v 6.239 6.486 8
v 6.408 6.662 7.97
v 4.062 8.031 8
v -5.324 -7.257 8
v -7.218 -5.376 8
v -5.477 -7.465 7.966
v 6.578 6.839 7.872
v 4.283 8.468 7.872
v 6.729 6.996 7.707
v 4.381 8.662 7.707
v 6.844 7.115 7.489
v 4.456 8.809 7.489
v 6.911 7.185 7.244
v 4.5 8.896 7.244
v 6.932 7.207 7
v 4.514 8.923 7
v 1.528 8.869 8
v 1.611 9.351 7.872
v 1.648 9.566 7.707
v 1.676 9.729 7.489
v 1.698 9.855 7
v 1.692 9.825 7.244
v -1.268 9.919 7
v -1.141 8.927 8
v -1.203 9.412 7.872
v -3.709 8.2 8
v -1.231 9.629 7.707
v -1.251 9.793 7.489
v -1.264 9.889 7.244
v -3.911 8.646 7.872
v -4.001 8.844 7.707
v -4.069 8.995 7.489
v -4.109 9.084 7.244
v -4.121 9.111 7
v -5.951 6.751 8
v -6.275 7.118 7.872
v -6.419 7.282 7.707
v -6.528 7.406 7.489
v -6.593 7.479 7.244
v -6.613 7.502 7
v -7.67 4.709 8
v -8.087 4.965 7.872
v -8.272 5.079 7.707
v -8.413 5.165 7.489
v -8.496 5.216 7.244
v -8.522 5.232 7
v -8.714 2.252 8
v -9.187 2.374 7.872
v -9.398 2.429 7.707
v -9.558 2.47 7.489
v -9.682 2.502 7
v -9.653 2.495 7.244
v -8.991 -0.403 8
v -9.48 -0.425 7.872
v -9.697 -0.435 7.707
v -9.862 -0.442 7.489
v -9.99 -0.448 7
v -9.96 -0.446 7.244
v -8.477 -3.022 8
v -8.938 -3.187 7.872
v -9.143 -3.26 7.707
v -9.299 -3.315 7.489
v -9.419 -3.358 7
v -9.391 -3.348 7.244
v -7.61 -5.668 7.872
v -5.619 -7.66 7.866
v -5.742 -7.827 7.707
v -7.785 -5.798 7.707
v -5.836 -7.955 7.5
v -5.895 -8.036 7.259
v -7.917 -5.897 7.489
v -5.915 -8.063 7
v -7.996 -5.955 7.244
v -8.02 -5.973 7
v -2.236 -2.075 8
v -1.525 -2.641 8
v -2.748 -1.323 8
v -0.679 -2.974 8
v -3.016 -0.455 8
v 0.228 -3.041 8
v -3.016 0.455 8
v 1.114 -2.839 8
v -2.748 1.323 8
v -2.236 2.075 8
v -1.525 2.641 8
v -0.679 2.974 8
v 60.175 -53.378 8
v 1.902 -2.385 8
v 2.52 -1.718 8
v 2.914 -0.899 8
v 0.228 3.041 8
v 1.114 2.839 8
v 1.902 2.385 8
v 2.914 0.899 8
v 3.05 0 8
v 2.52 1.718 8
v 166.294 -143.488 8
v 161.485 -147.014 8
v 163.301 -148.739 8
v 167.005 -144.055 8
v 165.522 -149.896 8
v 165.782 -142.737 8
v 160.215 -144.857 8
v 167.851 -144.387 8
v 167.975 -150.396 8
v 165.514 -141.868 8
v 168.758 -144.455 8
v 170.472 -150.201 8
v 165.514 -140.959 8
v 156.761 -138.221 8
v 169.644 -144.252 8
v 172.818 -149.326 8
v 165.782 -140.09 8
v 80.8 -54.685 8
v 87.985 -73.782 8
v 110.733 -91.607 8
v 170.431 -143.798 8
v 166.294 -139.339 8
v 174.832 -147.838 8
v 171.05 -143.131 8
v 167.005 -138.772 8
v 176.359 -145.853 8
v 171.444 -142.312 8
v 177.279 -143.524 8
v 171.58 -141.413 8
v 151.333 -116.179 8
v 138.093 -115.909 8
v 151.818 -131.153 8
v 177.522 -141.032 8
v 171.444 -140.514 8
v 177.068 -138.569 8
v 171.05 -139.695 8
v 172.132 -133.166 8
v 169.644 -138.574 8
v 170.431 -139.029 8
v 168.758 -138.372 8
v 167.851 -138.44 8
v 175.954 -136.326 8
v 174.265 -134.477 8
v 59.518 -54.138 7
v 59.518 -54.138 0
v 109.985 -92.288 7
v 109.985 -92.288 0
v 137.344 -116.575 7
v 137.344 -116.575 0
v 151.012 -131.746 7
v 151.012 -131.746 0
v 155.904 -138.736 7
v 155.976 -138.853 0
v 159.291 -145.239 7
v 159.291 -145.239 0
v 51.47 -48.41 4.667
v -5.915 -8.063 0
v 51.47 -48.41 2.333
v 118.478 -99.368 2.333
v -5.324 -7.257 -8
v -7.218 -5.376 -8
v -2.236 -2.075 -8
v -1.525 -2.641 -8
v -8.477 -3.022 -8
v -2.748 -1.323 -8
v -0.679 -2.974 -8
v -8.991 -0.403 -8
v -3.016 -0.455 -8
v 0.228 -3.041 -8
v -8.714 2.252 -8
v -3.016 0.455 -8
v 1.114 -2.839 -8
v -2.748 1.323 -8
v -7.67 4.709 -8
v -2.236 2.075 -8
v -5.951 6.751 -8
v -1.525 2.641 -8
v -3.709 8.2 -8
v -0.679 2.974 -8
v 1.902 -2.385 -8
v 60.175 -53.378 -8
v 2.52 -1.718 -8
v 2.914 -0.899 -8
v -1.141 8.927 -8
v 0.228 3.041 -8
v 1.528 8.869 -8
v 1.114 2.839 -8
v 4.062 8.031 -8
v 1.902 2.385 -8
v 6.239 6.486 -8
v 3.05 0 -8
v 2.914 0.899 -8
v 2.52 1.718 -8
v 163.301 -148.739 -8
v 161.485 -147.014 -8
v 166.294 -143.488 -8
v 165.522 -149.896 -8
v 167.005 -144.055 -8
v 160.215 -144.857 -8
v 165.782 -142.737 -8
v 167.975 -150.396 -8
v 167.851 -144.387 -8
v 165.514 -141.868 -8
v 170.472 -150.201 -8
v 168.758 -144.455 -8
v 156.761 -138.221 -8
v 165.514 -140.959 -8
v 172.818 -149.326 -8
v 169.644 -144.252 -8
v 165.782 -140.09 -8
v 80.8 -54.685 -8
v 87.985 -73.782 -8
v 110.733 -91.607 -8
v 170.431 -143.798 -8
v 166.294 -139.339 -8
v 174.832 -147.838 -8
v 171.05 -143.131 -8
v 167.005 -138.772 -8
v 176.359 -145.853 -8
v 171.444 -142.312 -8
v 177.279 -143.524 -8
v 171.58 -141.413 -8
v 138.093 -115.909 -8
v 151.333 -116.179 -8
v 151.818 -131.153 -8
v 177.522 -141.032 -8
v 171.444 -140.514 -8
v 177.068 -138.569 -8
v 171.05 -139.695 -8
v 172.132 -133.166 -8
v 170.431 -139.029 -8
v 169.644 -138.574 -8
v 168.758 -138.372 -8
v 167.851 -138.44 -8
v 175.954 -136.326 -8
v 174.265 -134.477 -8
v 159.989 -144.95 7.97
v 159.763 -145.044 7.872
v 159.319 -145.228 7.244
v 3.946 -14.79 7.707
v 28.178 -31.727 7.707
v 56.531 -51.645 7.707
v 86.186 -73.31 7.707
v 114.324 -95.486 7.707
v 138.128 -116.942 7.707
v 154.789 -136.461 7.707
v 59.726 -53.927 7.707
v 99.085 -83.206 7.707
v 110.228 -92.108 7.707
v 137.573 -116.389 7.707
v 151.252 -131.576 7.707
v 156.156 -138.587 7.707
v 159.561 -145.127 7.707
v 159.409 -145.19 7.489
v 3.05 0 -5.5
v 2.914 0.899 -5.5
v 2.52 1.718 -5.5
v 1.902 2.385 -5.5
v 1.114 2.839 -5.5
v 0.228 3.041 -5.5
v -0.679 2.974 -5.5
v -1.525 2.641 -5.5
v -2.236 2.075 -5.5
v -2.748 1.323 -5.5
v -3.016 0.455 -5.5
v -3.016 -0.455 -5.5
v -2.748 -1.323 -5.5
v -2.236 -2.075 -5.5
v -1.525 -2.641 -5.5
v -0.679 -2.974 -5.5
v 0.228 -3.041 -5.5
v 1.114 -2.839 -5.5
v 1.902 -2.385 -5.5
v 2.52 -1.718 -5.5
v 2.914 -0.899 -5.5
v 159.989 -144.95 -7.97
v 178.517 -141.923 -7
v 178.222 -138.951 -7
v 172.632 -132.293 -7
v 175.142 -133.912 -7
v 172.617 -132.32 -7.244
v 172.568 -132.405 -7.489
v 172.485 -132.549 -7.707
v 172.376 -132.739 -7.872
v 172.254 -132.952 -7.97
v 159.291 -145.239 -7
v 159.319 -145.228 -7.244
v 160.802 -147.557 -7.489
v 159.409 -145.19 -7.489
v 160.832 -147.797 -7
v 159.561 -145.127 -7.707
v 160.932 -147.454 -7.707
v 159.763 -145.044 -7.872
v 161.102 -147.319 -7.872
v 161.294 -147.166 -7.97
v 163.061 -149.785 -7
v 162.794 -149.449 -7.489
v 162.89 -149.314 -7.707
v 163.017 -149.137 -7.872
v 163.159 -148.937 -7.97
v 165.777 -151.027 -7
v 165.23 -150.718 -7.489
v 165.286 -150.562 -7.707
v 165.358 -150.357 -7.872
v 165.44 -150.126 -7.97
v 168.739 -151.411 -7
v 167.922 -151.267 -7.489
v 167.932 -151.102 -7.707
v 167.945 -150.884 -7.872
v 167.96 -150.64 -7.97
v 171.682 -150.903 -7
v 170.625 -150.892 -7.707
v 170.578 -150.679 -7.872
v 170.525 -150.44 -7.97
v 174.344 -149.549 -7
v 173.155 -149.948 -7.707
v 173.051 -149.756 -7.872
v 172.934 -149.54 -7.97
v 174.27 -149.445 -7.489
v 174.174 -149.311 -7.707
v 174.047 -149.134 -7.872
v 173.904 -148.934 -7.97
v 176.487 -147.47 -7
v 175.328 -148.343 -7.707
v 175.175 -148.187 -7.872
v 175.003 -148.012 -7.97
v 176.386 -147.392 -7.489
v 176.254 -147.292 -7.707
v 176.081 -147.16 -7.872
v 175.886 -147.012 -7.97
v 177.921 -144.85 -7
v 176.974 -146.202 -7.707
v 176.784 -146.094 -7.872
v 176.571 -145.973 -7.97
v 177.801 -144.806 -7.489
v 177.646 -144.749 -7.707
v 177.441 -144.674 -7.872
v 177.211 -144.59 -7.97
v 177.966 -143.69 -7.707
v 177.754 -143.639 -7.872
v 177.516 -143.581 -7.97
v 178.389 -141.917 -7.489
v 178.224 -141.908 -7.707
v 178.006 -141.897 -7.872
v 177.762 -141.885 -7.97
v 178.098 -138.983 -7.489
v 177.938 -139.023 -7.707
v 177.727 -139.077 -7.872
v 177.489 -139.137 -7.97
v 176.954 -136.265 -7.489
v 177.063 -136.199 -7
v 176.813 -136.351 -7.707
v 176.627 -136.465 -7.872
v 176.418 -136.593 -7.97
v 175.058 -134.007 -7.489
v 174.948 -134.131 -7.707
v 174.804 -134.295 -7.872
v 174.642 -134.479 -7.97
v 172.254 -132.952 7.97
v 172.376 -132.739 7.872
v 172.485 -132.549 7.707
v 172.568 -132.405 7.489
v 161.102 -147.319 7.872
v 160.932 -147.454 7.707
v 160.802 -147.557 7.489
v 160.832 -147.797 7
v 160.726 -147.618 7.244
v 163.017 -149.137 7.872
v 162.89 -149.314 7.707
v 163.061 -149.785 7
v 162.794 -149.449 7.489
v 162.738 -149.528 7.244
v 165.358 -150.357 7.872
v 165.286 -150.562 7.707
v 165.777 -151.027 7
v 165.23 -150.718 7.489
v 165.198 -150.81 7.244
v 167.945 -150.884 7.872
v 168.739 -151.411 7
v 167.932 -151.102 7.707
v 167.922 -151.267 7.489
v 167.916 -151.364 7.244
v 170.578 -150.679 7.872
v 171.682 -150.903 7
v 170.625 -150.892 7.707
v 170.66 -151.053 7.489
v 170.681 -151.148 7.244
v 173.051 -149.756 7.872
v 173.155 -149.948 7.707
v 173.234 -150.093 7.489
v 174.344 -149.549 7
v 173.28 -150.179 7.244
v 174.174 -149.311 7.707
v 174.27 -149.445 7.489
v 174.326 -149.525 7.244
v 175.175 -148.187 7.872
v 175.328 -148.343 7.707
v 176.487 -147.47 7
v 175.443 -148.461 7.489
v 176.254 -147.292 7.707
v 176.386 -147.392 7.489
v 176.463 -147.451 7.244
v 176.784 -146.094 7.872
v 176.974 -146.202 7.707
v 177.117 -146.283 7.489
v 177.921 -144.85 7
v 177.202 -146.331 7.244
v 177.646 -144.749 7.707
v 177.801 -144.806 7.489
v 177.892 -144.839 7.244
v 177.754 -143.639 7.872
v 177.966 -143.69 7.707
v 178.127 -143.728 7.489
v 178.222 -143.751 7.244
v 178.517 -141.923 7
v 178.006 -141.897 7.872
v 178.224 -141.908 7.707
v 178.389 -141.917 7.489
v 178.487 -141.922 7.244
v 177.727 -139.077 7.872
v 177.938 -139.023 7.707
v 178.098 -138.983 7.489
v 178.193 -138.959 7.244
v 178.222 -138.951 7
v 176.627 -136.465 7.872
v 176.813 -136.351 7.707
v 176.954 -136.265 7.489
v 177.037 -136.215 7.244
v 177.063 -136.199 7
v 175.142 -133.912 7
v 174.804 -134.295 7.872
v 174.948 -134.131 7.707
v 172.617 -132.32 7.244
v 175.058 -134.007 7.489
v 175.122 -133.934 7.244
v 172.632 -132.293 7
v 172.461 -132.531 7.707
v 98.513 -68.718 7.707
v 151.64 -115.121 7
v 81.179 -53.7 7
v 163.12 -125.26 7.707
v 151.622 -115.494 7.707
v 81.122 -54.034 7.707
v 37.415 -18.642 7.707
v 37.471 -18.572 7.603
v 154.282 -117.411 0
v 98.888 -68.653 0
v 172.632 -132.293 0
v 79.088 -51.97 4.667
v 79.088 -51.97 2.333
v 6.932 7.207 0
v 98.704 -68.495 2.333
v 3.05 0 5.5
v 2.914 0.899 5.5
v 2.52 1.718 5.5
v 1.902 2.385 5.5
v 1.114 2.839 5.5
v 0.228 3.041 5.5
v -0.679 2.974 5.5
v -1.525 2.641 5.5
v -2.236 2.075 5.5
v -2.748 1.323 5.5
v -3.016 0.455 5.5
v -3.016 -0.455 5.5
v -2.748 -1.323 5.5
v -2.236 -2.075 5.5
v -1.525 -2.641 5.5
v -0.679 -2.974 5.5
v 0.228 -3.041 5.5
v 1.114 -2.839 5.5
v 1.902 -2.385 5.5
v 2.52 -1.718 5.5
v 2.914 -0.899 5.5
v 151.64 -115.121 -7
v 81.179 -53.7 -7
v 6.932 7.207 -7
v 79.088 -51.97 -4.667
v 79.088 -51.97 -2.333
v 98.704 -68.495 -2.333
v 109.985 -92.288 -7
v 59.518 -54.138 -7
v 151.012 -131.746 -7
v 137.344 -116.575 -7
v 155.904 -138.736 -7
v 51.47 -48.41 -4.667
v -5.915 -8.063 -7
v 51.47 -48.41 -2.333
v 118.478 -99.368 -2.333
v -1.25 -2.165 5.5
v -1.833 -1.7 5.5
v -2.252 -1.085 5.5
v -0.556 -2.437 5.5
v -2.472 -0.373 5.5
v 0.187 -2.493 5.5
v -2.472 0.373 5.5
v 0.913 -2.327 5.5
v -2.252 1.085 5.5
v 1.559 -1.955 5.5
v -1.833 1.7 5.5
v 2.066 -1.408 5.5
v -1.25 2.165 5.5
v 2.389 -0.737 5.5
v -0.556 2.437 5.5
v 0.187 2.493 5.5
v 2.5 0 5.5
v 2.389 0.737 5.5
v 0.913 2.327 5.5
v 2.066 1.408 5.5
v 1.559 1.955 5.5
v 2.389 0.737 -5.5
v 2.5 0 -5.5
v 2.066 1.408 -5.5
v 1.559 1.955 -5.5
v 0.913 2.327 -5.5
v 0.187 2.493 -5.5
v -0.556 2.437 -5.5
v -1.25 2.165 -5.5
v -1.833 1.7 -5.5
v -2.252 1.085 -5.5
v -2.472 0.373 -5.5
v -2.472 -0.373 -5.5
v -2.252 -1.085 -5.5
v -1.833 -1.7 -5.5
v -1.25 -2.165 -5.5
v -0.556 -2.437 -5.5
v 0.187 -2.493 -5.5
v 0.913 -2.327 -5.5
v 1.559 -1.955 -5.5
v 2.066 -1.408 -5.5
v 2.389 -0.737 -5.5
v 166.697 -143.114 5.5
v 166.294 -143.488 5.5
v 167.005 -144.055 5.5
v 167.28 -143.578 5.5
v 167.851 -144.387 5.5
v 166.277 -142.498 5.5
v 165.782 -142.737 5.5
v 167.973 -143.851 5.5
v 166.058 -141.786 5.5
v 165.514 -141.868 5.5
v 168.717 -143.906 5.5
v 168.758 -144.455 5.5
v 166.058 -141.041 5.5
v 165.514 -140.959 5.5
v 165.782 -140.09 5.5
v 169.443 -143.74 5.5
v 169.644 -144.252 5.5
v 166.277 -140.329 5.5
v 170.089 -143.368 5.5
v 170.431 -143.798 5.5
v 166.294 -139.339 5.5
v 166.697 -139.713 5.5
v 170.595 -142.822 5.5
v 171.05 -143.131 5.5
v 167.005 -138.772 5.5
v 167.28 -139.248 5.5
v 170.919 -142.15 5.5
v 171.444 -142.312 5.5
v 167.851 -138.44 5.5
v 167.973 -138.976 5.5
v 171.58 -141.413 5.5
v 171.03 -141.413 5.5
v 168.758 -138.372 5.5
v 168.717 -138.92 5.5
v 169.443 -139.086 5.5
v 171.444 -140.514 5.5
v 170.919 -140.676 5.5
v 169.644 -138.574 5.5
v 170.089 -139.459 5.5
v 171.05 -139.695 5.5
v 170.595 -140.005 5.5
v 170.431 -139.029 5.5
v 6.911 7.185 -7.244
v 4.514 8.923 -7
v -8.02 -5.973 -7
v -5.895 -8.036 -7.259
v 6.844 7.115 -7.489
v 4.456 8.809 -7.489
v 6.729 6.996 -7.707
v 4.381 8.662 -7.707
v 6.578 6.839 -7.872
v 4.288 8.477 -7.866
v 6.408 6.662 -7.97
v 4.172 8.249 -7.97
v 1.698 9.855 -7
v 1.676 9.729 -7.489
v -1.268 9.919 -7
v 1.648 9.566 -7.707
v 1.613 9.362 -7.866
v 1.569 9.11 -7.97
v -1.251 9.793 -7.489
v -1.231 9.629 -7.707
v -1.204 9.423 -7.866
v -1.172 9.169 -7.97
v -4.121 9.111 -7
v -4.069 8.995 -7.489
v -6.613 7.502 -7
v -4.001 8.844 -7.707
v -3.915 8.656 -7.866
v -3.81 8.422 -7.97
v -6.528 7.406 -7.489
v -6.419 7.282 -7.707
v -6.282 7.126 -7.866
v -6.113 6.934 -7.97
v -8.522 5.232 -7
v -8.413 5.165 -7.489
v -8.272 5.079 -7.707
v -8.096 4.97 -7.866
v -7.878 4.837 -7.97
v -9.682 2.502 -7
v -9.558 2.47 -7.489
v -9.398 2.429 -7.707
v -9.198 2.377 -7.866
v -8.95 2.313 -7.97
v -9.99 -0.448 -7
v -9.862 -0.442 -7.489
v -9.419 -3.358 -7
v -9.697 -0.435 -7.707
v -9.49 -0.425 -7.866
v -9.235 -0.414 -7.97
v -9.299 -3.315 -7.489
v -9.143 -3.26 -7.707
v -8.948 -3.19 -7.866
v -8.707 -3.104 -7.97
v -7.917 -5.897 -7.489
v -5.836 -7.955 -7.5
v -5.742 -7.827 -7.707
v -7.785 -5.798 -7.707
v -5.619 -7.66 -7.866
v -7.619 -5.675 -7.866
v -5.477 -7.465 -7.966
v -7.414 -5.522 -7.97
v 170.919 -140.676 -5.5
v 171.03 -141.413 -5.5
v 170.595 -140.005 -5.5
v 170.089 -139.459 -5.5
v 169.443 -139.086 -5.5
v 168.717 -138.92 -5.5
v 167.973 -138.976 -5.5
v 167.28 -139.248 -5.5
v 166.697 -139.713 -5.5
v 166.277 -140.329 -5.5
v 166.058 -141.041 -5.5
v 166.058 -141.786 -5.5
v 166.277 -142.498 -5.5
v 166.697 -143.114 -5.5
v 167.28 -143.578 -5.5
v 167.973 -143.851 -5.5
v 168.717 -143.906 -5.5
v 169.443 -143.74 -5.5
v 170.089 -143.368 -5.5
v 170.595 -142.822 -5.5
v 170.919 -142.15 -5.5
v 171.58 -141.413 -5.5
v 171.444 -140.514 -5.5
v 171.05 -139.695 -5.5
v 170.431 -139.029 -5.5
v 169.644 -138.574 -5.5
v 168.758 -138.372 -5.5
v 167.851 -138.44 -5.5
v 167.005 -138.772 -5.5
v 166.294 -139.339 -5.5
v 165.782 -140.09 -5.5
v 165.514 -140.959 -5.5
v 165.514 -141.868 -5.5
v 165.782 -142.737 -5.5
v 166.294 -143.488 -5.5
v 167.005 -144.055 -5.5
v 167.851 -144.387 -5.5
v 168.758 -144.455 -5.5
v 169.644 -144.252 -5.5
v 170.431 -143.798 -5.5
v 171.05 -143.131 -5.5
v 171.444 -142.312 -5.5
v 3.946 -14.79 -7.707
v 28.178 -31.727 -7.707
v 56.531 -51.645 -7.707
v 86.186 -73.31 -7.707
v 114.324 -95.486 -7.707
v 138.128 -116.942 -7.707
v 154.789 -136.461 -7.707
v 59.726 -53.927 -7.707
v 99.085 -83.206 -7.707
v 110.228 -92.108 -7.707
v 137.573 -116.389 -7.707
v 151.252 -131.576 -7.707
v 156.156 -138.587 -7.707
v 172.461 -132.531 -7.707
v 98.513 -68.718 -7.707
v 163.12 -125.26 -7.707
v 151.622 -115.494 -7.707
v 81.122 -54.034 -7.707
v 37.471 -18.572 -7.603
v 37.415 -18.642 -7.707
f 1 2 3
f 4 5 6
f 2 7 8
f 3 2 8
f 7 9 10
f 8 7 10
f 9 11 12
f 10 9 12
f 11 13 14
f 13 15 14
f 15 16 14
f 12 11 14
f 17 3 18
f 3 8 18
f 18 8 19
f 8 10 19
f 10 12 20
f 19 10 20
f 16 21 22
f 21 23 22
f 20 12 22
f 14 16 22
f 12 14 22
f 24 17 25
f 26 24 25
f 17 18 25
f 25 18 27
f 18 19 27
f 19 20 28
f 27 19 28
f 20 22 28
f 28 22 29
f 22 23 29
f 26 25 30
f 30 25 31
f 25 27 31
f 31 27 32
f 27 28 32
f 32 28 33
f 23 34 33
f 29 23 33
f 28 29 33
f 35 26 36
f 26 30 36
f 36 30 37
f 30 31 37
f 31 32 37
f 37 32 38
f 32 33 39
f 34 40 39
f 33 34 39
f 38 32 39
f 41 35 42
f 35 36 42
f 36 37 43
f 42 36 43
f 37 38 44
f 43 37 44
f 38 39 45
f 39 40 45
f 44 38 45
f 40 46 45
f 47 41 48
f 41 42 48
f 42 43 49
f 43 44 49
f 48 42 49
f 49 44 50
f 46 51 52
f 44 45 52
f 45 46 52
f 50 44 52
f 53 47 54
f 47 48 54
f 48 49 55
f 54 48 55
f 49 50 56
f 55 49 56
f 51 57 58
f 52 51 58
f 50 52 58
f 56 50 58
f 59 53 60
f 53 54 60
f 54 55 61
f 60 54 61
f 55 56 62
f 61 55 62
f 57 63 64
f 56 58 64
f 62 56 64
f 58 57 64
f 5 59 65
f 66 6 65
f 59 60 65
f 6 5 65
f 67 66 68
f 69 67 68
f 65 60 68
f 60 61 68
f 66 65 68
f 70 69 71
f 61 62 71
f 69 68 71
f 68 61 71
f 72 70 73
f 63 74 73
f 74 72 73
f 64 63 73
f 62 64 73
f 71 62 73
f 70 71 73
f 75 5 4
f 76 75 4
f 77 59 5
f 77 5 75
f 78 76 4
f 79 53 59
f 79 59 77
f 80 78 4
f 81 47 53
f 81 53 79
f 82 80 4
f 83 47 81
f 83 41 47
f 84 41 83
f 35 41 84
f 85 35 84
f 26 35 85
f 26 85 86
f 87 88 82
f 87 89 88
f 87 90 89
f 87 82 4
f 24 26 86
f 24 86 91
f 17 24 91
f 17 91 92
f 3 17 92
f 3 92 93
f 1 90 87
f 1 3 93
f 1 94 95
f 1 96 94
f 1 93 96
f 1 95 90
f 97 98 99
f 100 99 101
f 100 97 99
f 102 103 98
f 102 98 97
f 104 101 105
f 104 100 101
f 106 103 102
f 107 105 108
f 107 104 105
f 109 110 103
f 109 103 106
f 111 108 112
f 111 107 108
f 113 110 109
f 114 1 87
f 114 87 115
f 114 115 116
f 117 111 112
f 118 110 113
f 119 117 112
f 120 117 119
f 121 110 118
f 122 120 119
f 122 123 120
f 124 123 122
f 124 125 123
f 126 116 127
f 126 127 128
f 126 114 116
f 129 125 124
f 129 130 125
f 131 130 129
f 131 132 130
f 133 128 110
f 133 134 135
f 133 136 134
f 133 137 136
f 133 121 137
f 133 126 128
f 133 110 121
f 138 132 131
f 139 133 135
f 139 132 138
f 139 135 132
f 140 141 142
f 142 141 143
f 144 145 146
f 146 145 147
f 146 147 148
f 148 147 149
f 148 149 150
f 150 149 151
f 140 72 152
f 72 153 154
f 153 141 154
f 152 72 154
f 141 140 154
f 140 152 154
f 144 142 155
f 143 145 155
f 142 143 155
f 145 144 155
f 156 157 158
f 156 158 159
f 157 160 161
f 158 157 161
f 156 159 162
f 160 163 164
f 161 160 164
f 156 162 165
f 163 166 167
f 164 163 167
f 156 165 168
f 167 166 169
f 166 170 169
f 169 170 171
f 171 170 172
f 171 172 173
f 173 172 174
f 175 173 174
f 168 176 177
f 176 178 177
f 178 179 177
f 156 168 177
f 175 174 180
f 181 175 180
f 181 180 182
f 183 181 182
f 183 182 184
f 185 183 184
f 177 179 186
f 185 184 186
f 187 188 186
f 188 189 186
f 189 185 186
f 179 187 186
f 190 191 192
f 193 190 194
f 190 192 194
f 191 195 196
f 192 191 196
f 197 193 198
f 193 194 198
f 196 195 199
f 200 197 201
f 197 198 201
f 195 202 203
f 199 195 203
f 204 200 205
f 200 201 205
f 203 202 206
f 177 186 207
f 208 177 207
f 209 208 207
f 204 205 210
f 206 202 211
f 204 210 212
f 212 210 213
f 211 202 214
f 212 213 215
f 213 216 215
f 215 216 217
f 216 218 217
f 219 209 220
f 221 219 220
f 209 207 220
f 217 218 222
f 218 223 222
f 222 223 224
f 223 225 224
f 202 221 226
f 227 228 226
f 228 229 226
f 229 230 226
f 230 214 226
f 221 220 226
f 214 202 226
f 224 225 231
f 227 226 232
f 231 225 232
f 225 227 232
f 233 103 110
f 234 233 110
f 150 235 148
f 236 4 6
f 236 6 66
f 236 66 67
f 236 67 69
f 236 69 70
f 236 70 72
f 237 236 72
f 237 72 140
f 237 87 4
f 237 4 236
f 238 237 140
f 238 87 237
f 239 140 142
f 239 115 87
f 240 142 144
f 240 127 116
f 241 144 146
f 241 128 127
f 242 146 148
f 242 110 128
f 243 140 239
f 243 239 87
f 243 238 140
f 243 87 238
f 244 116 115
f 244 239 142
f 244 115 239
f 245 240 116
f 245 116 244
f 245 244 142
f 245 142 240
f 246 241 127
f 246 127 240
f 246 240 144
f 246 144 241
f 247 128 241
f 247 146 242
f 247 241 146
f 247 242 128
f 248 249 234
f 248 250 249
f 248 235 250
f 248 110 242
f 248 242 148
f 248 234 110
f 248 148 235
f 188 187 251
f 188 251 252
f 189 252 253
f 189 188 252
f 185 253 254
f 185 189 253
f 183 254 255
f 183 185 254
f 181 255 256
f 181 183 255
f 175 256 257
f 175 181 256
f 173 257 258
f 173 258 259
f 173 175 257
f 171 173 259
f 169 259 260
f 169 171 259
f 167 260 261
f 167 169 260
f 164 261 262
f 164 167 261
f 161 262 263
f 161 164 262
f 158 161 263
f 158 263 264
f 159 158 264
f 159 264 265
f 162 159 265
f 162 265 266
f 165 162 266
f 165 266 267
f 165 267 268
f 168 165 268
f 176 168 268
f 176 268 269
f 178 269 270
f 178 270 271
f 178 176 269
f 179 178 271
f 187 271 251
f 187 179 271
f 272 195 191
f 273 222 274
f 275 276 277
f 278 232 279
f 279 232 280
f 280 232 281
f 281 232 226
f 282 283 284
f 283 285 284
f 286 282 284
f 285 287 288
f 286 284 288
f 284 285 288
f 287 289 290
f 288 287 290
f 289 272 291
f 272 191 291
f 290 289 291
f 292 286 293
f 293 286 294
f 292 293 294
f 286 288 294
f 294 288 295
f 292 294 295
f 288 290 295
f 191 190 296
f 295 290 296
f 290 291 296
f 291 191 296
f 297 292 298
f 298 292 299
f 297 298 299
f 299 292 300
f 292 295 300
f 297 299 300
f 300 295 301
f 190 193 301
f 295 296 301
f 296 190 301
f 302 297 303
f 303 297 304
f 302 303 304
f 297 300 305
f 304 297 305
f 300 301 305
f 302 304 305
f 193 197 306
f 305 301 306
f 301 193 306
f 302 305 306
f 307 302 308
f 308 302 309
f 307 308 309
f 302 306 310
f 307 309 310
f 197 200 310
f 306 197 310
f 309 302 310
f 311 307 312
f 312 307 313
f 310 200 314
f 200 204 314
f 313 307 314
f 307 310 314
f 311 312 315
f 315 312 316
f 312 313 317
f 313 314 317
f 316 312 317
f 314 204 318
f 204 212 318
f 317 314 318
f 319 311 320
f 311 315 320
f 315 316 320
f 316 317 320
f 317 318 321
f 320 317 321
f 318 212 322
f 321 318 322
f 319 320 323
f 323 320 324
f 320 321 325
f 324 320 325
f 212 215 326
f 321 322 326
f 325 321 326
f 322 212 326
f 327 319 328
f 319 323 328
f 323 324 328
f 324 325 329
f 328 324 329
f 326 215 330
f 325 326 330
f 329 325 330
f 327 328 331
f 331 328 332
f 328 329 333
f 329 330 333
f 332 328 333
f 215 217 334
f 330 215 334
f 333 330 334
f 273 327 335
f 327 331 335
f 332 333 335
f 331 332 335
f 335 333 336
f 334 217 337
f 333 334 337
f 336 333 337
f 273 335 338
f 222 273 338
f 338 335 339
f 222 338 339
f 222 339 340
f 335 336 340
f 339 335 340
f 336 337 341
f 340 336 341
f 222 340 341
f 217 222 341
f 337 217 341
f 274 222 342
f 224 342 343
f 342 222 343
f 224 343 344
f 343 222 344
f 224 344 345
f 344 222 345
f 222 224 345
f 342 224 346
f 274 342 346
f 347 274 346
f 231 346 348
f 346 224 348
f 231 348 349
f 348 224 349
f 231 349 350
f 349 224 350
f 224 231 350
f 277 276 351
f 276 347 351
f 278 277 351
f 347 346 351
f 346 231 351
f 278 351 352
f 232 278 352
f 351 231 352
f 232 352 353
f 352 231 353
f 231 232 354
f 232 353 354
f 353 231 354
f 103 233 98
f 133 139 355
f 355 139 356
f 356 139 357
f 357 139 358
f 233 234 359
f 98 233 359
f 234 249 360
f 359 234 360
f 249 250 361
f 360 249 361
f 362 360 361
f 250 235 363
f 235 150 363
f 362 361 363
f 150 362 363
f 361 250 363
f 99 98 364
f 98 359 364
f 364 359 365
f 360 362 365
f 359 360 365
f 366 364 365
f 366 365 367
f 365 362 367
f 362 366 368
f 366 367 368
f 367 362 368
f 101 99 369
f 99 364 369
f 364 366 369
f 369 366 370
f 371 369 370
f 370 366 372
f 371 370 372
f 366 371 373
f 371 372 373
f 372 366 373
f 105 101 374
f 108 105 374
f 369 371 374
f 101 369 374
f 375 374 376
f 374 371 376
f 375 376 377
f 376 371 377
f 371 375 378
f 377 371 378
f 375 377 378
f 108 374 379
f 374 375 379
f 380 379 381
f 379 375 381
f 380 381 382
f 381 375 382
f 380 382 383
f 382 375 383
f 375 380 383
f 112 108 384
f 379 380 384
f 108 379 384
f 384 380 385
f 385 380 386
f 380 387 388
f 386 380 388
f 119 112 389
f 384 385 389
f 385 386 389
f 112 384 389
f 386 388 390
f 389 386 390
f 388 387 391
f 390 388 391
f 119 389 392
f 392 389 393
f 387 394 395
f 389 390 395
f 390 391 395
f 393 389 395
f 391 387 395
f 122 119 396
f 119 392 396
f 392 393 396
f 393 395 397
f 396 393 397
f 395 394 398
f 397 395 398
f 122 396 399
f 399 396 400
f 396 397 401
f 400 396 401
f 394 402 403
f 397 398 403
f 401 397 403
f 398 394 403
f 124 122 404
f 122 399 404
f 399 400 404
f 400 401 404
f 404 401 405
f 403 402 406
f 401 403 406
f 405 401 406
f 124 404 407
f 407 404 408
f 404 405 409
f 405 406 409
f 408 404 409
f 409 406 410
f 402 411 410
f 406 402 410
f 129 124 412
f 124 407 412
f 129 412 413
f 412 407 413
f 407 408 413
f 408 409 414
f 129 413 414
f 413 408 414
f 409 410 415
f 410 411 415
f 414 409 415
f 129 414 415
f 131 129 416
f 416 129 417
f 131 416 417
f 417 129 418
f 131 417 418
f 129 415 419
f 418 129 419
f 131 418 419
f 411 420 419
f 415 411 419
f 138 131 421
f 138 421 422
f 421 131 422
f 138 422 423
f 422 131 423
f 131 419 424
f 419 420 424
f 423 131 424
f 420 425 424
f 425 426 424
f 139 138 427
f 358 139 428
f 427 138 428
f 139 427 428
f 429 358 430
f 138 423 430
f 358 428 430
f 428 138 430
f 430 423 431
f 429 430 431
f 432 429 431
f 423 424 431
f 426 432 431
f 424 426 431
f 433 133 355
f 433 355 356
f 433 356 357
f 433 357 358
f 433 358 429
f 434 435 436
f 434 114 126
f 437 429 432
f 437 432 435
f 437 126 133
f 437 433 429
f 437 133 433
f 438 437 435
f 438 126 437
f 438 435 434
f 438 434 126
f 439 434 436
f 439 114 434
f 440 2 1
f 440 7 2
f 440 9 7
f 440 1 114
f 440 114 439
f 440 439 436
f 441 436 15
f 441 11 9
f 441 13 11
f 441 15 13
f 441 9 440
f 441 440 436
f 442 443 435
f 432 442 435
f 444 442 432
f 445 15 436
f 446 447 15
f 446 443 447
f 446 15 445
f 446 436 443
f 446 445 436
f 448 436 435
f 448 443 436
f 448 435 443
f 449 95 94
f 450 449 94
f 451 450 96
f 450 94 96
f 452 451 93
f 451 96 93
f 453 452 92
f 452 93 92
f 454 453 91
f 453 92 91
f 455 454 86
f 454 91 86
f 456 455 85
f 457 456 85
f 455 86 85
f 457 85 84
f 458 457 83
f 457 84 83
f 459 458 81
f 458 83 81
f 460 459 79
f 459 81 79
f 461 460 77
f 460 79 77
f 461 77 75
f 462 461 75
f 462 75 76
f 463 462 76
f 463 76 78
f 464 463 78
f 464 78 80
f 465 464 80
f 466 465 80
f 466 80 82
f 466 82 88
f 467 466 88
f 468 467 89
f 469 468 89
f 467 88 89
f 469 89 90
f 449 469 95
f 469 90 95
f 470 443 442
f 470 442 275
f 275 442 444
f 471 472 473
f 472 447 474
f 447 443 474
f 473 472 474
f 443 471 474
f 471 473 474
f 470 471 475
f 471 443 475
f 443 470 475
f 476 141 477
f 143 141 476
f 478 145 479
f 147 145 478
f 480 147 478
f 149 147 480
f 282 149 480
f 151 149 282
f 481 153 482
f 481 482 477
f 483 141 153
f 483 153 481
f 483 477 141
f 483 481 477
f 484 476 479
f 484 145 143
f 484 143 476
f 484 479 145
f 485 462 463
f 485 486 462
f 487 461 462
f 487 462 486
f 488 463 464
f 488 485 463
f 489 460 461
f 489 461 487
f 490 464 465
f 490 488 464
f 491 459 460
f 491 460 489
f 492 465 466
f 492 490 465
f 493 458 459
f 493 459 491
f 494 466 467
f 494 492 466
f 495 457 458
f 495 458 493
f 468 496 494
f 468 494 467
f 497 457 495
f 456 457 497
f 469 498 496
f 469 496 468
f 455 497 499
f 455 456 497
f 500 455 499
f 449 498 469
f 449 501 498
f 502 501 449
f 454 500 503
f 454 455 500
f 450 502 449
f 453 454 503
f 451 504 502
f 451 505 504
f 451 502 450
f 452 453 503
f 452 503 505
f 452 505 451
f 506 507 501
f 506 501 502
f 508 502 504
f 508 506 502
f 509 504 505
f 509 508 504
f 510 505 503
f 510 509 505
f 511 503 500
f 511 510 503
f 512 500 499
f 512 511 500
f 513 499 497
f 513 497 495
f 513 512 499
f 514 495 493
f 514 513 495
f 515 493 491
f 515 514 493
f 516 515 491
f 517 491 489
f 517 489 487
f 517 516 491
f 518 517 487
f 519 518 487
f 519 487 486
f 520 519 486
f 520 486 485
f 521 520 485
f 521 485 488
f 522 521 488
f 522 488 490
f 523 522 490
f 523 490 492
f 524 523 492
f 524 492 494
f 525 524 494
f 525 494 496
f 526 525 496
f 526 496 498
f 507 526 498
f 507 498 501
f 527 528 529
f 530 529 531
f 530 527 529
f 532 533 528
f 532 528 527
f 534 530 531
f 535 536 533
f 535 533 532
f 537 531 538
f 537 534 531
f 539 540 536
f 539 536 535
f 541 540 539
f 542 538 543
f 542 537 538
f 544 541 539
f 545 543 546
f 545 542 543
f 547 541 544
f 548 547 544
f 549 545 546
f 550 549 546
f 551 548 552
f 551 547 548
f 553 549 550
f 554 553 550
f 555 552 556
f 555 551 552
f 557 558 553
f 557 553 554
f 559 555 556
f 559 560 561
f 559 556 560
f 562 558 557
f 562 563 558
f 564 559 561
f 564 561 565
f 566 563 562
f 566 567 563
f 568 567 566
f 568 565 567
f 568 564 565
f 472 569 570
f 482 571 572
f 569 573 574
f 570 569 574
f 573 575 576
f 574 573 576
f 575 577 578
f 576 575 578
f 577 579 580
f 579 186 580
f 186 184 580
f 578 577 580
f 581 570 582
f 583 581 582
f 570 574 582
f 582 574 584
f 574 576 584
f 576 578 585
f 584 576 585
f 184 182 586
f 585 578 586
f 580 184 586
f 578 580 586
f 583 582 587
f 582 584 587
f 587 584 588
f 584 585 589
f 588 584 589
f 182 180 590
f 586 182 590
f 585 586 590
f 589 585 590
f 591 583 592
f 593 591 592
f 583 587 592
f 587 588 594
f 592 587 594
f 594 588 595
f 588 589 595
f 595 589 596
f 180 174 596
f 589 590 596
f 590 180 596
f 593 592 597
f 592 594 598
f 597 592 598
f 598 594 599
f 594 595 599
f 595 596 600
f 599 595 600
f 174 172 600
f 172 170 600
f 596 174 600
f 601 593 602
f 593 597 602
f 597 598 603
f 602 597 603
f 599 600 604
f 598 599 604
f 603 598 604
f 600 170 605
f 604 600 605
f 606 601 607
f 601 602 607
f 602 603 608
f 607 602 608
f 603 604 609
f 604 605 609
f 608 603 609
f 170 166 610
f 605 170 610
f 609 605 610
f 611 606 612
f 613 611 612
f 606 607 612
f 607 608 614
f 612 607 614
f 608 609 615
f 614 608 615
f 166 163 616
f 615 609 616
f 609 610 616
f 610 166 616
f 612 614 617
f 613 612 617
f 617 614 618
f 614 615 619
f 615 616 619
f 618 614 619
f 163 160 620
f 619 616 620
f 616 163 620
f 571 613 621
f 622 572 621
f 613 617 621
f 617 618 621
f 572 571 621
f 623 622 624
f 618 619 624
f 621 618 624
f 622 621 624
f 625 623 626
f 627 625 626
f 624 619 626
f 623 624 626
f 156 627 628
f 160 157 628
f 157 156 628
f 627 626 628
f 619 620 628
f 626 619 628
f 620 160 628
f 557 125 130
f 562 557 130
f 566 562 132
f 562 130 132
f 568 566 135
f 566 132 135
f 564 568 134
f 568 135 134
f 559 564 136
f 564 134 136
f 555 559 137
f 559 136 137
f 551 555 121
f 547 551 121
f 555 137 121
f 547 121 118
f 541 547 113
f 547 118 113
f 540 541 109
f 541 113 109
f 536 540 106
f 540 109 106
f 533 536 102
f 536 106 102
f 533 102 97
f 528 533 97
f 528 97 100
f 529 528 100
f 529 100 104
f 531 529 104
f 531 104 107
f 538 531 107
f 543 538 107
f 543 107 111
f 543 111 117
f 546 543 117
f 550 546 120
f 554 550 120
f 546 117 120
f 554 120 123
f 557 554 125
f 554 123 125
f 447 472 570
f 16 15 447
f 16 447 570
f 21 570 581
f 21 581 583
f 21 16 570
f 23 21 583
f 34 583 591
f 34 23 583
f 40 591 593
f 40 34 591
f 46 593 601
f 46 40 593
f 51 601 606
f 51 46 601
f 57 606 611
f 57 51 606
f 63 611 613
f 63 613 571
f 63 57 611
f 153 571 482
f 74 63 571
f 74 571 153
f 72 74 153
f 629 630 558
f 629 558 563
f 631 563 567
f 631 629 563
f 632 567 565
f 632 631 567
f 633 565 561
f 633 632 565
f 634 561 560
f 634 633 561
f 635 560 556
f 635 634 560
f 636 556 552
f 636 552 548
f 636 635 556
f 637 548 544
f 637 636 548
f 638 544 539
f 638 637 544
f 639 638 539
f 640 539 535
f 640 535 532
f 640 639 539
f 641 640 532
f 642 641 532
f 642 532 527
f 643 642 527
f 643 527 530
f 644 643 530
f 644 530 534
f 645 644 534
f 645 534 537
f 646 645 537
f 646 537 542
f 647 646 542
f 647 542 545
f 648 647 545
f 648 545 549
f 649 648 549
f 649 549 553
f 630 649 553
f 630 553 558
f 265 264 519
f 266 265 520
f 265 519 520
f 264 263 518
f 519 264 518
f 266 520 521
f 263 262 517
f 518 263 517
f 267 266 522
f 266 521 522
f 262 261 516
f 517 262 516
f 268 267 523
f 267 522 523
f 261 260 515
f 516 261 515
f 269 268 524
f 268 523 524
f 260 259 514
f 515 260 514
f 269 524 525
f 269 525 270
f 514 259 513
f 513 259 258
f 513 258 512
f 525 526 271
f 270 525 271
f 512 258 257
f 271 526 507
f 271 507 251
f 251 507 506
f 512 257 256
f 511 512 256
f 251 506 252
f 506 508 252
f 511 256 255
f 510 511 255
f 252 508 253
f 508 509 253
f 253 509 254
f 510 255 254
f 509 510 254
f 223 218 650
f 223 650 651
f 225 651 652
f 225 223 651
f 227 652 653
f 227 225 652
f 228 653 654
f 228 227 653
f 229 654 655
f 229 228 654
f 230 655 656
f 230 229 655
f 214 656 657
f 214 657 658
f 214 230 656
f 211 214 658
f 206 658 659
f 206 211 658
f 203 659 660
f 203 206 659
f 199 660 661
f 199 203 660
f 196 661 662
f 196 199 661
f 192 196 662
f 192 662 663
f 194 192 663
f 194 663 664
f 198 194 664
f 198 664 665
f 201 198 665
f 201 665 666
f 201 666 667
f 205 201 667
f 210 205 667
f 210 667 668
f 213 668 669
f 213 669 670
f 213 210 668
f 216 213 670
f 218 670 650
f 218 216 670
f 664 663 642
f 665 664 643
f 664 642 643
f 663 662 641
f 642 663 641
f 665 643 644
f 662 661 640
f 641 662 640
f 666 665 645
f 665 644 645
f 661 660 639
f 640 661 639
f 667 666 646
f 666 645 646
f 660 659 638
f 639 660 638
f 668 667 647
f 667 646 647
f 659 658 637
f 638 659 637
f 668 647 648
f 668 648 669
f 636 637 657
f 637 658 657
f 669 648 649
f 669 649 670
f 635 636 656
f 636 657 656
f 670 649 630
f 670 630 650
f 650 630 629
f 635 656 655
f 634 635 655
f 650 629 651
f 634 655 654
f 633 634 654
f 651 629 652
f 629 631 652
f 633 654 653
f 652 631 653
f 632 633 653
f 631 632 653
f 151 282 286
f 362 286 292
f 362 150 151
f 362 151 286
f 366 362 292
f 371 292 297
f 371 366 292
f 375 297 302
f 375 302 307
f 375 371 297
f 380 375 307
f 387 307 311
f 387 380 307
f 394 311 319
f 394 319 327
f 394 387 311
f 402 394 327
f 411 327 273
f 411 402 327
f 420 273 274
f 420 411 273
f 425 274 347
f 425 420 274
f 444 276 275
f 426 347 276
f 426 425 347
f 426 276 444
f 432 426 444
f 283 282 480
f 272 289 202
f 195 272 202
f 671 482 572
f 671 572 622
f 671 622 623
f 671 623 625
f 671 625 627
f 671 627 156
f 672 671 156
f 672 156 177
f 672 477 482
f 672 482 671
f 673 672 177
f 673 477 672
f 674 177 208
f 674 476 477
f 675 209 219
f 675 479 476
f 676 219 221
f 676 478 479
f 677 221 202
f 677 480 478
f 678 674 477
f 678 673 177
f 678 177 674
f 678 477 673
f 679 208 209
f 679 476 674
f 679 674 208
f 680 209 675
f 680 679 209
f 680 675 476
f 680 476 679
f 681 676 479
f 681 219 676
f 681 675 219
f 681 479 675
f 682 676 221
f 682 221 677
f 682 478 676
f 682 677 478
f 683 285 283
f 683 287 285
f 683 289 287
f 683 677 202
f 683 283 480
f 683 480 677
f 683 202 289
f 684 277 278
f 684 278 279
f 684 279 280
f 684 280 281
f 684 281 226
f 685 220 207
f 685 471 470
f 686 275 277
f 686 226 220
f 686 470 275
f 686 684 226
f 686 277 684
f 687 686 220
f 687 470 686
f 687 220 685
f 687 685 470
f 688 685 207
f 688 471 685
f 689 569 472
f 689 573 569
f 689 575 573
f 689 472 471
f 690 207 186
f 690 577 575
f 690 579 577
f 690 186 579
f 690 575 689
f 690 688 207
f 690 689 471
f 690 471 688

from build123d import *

# Parameters (mm, degrees)
SKETCH1_R           = 10
BOSS_EXTRUDE1_DEPTH = 8
SKETCH2_R           = 3.05
CUT_EXTRUDE1_DEPTH  = 2.5
SKETCH3_R           = 2.5
CUT_EXTRUDE2_DEPTH  = 235.228224388
FILLET1_R           = 1


with BuildPart() as part:
    # Sketch1 → Boss-Extrude1 (new body)
    with BuildSketch(Plane.XY):
        Circle(SKETCH1_R)
        with BuildLine():
            ThreePointArc((6.932380368, 7.207086959), (9.20119024, 3.916388408), (10, 0))
            ThreePointArc((10, 0), (4.519348384, -8.920509525), (-5.915098037, -8.062978061))
            add(Edge.make_bspline(
                [(-5.915098037, -8.062978061), (34.718192947, -37.87205083), (143.515545331, -107.14371417), (159.290587236, -145.239154883)],
                knots=[0, 0, 0, 0, 1, 1, 1, 1], degree=3))
            ThreePointArc((159.290587236, -145.239154883), (161.565900633, -134.236616192), (172.63191834, -132.293381565))
            add(Edge.make_bspline(
                [(6.932380368, 7.207086959), (17.244305655, -2.711787175), (60.227105828, -35.931261983), (124.750363865, -90.380113257), (157.248120819, -121.224147407), (172.63191834, -132.293381565)],
                knots=[0, 0, 0, 0, 0.399023762, 0.499023762, 1, 1, 1, 1], degree=3))
        make_face()
        with Locations((168.529777486, -141.413274131)):
            Circle(SKETCH1_R)
    boss_extrude1 = extrude(amount=BOSS_EXTRUDE1_DEPTH)

    # Sketch2 → Cut-Extrude1 (cut)
    with BuildSketch(Plane.XY.offset(8)):
        Circle(SKETCH2_R)
        with Locations((168.529777486, -141.413274131)):
            Circle(SKETCH2_R)
    cut_extrude1 = extrude(amount=-CUT_EXTRUDE1_DEPTH, mode=Mode.SUBTRACT)

    # Sketch3 → Cut-Extrude2 (cut, through all)
    with BuildSketch(Plane.XY.offset(8)):
        Circle(SKETCH3_R)
        with Locations((168.529777486, -141.413274131)):
            Circle(SKETCH3_R)
    cut_extrude2 = extrude(amount=-CUT_EXTRUDE2_DEPTH, mode=Mode.SUBTRACT)

    # Mirror1: Boss-Extrude1, Cut-Extrude1, Cut-Extrude2 across plane
    add(boss_extrude1.mirror(Plane.XY))
    add(cut_extrude1.mirror(Plane.XY), mode=Mode.SUBTRACT)
    add(cut_extrude2.mirror(Plane.XY), mode=Mode.SUBTRACT)

    # Fillet1
    fillet1_edges = [part.edges().sort_by_distance(p)[0] for p in [
        (82.198981844, -70.686100864, 8),
        (175.493654339, -148.58993207, 8),
        (90.595273902, -61.585291098, 8),
        (-7.651956434, 6.437978156, -8),
        (175.493654339, -148.58993207, -8),
        (82.198981844, -70.686100864, -8),
        (90.595273902, -61.585291098, -8),
        (-7.651956434, 6.437978156, 8),
    ]]
    fillet(fillet1_edges, radius=FILLET1_R)


solid = part.part
